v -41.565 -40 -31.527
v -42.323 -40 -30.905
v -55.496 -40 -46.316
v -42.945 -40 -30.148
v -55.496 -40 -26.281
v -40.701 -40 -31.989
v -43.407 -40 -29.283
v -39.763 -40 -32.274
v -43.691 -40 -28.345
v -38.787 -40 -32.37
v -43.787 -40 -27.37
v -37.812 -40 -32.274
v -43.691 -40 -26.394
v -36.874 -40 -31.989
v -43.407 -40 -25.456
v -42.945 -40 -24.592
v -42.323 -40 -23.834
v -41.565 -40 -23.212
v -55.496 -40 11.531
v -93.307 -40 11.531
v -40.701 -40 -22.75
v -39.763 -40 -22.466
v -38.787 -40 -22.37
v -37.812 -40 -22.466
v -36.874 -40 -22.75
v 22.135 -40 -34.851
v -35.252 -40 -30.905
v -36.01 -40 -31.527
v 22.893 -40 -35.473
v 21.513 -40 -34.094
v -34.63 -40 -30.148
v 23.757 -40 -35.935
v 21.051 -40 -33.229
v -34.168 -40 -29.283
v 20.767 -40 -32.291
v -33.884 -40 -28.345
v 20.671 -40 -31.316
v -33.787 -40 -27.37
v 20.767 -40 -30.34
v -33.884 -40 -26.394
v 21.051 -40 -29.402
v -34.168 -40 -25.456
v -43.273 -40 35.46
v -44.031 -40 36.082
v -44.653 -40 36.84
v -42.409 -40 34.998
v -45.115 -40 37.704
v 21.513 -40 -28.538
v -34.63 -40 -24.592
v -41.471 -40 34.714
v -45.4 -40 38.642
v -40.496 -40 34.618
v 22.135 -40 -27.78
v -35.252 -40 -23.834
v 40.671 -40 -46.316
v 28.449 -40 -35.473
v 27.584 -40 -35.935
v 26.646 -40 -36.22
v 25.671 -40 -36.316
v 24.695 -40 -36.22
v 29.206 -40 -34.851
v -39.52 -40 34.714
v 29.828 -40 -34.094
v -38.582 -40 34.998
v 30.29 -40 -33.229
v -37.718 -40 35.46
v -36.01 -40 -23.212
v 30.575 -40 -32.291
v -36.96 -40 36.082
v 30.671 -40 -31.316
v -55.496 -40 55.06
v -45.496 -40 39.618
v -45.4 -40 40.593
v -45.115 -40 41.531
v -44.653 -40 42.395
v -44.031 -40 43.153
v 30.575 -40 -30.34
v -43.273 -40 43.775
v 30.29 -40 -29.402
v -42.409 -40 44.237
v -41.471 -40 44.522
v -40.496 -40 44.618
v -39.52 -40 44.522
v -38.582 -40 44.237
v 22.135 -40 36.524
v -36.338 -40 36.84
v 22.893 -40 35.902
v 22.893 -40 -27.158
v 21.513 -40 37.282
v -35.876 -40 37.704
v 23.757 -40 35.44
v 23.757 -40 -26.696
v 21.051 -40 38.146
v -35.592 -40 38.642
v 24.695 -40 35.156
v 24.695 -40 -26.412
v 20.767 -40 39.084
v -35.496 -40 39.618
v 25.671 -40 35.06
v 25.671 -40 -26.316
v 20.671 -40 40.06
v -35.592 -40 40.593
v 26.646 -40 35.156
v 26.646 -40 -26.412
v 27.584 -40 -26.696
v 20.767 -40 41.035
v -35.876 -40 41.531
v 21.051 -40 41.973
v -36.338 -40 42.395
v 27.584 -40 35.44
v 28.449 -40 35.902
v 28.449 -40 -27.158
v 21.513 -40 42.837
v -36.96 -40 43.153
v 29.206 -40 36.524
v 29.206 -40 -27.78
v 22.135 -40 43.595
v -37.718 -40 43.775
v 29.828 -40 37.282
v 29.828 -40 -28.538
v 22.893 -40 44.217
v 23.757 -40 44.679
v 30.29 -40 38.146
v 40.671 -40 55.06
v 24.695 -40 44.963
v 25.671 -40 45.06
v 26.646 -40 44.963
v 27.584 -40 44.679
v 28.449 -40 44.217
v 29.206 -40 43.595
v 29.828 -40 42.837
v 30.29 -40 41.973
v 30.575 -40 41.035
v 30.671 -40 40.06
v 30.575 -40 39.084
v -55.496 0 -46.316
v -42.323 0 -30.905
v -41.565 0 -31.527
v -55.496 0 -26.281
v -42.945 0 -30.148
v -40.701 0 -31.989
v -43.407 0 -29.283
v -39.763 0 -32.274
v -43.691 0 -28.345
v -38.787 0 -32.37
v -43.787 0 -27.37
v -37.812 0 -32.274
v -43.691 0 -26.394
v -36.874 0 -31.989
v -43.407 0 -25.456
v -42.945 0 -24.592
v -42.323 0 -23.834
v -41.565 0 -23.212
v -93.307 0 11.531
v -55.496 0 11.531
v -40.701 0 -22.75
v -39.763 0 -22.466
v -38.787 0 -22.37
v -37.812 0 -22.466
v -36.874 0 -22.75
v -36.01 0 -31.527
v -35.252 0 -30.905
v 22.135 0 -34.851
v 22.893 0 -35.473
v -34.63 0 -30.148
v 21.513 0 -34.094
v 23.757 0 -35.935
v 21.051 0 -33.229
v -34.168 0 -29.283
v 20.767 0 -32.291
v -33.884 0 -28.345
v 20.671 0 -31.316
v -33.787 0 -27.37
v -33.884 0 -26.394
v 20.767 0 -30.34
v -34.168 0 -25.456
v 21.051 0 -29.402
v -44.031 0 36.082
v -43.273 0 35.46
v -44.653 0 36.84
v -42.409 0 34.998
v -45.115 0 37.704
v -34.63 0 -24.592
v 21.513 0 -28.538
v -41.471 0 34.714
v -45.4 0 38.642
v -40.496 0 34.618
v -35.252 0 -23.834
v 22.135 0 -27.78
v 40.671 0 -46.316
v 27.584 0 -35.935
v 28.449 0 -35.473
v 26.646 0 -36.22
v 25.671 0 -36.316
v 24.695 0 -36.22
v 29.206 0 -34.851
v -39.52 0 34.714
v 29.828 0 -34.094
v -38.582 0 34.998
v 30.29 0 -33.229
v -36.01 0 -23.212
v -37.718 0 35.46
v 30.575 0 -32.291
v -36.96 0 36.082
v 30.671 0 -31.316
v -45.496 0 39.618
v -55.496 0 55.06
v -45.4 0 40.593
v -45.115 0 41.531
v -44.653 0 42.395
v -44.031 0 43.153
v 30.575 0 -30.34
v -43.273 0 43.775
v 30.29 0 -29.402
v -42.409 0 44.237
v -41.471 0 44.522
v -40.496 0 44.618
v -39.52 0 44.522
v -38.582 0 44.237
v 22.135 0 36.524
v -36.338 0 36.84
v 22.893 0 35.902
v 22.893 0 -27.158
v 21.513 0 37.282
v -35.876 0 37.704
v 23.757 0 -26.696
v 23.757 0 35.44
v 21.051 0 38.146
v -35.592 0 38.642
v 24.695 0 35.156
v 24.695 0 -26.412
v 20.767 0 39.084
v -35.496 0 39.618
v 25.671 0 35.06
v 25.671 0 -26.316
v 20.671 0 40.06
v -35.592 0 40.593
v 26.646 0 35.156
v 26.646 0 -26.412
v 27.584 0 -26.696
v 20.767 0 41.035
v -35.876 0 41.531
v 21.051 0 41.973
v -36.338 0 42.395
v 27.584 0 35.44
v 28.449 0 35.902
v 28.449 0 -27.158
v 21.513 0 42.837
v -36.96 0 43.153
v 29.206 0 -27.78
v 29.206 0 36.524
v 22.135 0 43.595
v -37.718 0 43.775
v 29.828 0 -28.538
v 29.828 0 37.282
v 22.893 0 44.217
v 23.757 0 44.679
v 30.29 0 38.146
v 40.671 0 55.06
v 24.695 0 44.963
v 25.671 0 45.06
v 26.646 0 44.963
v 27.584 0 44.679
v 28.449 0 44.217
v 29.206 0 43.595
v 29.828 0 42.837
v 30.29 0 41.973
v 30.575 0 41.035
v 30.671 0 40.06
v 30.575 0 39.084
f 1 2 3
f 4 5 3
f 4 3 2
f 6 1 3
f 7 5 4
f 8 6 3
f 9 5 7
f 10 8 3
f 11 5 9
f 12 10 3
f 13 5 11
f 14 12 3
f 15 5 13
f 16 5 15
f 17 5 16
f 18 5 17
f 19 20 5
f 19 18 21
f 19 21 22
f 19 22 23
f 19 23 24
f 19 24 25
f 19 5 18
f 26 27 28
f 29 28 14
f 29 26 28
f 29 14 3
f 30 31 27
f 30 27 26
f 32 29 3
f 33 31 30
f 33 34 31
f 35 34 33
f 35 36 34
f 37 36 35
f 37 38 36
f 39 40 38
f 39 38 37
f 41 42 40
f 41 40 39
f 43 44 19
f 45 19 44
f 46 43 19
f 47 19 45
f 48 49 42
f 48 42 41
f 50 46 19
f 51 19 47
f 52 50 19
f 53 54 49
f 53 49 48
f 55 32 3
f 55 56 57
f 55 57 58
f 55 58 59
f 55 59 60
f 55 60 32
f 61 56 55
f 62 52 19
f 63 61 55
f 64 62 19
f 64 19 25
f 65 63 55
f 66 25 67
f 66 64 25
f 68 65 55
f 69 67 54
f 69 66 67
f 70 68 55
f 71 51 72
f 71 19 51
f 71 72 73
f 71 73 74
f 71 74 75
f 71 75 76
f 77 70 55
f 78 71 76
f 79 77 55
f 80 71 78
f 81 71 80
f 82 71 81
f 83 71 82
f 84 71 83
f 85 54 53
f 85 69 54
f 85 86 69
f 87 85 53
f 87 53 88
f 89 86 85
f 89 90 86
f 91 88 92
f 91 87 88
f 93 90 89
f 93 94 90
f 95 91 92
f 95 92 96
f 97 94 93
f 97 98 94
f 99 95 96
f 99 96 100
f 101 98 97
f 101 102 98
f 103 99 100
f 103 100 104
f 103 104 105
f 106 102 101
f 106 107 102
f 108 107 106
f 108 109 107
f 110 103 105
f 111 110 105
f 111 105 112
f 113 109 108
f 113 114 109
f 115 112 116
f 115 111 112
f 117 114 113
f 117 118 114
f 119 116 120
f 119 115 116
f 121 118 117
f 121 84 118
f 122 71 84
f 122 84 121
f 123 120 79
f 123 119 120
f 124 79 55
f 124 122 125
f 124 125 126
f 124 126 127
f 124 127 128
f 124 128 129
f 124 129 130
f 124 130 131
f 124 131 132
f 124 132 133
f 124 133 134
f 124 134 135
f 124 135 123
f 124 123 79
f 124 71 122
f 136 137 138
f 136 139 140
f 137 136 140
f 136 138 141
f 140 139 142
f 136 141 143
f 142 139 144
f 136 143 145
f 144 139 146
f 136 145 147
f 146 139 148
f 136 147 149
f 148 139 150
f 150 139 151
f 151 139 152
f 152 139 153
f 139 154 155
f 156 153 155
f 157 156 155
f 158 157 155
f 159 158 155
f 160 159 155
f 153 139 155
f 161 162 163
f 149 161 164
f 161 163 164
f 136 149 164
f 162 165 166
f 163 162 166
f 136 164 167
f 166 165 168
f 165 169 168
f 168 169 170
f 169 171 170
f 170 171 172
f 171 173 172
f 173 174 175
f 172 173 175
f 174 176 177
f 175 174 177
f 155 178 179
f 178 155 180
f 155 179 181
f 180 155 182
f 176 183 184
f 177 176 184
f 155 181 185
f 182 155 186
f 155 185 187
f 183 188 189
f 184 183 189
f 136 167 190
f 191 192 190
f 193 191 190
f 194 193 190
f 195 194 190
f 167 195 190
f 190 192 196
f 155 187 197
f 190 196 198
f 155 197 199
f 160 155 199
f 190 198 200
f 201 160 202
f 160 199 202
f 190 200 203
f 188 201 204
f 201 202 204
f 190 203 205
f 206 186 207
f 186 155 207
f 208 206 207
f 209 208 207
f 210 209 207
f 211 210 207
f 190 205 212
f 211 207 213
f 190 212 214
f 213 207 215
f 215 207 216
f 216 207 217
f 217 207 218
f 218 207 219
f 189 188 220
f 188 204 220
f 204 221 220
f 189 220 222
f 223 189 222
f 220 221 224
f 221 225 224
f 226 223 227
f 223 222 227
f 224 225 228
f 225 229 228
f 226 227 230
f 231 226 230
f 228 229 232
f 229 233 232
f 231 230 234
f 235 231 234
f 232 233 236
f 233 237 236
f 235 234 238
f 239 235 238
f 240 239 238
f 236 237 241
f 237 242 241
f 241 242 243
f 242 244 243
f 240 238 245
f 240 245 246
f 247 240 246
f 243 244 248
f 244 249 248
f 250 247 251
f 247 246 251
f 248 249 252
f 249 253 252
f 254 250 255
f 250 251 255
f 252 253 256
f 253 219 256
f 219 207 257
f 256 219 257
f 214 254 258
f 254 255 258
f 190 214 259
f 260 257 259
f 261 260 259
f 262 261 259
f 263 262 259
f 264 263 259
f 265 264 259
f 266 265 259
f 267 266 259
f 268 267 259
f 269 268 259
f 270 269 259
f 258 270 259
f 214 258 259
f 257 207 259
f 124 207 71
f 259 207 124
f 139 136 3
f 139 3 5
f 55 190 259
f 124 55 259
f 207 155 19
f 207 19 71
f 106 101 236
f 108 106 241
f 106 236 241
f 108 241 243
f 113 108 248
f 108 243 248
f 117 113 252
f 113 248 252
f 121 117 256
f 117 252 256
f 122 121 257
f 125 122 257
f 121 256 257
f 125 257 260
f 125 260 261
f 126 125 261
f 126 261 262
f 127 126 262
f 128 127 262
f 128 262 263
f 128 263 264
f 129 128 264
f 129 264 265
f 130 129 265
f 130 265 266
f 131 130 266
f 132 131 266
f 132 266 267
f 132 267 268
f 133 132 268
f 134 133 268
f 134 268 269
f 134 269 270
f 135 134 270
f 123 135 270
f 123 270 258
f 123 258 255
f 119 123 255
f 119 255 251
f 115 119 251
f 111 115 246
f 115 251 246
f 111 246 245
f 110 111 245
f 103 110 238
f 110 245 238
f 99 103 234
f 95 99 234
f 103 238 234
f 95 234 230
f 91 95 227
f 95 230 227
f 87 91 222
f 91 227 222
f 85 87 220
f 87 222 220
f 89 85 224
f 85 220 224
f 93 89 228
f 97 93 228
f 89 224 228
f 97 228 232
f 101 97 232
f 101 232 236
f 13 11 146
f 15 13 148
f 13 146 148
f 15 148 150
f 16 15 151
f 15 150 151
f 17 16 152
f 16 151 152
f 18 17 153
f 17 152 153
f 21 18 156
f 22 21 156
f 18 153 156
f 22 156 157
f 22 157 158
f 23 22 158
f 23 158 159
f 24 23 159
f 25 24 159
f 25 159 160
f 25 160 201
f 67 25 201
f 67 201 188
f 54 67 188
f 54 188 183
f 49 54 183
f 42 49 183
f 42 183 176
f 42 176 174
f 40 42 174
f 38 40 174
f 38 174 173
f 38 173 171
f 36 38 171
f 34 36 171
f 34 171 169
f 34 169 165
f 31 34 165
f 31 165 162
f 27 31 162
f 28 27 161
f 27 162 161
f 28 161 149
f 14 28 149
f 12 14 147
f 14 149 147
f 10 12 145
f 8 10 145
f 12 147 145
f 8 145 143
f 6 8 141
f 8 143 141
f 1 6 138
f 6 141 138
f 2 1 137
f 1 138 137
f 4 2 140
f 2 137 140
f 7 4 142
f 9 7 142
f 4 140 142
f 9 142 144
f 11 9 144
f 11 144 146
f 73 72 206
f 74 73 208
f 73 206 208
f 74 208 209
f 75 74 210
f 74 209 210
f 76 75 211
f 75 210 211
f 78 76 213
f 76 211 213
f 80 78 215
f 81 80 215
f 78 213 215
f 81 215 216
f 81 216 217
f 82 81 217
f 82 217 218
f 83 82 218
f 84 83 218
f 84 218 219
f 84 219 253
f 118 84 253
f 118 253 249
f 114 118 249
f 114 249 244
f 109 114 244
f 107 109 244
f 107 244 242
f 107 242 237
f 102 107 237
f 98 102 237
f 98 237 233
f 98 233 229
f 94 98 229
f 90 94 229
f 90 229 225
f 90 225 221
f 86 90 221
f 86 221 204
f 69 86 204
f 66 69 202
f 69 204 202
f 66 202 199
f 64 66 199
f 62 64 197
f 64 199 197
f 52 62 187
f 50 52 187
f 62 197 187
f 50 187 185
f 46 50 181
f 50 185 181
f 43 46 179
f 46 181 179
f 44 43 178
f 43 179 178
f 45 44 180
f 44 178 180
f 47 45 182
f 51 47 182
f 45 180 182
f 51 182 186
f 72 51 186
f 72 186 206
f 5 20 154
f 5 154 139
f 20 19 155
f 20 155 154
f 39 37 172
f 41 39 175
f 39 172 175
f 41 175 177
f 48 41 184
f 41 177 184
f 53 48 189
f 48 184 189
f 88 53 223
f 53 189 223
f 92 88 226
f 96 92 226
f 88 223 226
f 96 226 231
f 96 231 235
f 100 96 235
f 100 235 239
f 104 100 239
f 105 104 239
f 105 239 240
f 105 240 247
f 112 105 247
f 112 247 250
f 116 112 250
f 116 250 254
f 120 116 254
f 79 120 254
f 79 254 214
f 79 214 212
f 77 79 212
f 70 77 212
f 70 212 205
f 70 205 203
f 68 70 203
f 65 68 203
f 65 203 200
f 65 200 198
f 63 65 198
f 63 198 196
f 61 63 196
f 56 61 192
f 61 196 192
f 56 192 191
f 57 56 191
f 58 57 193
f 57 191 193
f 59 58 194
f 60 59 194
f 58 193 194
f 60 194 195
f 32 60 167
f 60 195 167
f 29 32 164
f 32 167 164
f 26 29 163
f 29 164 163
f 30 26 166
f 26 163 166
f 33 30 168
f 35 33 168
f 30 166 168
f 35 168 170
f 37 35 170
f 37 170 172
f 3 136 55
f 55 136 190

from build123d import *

# Parameters (mm, degrees)
F0_W     = 96.166272
F0_H     = 101.375278
F1_DEPTH = 40
F3_DEPTH = 40
F4_R     = 5
F5_DEPTH = 40.001


with BuildPart() as f1:
    # F0 (on Front) → F1 (new body)
    with BuildSketch(Plane.XZ):
        with Locations((-7.412447, 4.371865)):
            Rectangle(F0_W, F0_H)
    extrude(amount=F1_DEPTH)

    # F2 (on face) → F3 (join)
    with BuildSketch(Plane.XZ.offset(40)):
        Polygon((-93.307483, 11.53077), (-55.495583, -26.281131), (-55.495583, 11.53077), align=None)
    extrude(amount=-F3_DEPTH)

    # F4 (on face) → F5 (cut, through all)
    with BuildSketch(Plane(origin=(0, 0, 0), x_dir=(-1, 0, 0), z_dir=(0, 1, 0))):
        with Locations((38.787491, -27.369825)):
            Circle(F4_R)
        with Locations((-25.670689, -31.315774)):
            Circle(F4_R)
        with Locations((-25.670689, 40.059504)):
            Circle(F4_R)
        with Locations((40.495583, 39.617617)):
            Circle(F4_R)
    extrude(amount=-F5_DEPTH, mode=Mode.SUBTRACT)


solid = f1.part
